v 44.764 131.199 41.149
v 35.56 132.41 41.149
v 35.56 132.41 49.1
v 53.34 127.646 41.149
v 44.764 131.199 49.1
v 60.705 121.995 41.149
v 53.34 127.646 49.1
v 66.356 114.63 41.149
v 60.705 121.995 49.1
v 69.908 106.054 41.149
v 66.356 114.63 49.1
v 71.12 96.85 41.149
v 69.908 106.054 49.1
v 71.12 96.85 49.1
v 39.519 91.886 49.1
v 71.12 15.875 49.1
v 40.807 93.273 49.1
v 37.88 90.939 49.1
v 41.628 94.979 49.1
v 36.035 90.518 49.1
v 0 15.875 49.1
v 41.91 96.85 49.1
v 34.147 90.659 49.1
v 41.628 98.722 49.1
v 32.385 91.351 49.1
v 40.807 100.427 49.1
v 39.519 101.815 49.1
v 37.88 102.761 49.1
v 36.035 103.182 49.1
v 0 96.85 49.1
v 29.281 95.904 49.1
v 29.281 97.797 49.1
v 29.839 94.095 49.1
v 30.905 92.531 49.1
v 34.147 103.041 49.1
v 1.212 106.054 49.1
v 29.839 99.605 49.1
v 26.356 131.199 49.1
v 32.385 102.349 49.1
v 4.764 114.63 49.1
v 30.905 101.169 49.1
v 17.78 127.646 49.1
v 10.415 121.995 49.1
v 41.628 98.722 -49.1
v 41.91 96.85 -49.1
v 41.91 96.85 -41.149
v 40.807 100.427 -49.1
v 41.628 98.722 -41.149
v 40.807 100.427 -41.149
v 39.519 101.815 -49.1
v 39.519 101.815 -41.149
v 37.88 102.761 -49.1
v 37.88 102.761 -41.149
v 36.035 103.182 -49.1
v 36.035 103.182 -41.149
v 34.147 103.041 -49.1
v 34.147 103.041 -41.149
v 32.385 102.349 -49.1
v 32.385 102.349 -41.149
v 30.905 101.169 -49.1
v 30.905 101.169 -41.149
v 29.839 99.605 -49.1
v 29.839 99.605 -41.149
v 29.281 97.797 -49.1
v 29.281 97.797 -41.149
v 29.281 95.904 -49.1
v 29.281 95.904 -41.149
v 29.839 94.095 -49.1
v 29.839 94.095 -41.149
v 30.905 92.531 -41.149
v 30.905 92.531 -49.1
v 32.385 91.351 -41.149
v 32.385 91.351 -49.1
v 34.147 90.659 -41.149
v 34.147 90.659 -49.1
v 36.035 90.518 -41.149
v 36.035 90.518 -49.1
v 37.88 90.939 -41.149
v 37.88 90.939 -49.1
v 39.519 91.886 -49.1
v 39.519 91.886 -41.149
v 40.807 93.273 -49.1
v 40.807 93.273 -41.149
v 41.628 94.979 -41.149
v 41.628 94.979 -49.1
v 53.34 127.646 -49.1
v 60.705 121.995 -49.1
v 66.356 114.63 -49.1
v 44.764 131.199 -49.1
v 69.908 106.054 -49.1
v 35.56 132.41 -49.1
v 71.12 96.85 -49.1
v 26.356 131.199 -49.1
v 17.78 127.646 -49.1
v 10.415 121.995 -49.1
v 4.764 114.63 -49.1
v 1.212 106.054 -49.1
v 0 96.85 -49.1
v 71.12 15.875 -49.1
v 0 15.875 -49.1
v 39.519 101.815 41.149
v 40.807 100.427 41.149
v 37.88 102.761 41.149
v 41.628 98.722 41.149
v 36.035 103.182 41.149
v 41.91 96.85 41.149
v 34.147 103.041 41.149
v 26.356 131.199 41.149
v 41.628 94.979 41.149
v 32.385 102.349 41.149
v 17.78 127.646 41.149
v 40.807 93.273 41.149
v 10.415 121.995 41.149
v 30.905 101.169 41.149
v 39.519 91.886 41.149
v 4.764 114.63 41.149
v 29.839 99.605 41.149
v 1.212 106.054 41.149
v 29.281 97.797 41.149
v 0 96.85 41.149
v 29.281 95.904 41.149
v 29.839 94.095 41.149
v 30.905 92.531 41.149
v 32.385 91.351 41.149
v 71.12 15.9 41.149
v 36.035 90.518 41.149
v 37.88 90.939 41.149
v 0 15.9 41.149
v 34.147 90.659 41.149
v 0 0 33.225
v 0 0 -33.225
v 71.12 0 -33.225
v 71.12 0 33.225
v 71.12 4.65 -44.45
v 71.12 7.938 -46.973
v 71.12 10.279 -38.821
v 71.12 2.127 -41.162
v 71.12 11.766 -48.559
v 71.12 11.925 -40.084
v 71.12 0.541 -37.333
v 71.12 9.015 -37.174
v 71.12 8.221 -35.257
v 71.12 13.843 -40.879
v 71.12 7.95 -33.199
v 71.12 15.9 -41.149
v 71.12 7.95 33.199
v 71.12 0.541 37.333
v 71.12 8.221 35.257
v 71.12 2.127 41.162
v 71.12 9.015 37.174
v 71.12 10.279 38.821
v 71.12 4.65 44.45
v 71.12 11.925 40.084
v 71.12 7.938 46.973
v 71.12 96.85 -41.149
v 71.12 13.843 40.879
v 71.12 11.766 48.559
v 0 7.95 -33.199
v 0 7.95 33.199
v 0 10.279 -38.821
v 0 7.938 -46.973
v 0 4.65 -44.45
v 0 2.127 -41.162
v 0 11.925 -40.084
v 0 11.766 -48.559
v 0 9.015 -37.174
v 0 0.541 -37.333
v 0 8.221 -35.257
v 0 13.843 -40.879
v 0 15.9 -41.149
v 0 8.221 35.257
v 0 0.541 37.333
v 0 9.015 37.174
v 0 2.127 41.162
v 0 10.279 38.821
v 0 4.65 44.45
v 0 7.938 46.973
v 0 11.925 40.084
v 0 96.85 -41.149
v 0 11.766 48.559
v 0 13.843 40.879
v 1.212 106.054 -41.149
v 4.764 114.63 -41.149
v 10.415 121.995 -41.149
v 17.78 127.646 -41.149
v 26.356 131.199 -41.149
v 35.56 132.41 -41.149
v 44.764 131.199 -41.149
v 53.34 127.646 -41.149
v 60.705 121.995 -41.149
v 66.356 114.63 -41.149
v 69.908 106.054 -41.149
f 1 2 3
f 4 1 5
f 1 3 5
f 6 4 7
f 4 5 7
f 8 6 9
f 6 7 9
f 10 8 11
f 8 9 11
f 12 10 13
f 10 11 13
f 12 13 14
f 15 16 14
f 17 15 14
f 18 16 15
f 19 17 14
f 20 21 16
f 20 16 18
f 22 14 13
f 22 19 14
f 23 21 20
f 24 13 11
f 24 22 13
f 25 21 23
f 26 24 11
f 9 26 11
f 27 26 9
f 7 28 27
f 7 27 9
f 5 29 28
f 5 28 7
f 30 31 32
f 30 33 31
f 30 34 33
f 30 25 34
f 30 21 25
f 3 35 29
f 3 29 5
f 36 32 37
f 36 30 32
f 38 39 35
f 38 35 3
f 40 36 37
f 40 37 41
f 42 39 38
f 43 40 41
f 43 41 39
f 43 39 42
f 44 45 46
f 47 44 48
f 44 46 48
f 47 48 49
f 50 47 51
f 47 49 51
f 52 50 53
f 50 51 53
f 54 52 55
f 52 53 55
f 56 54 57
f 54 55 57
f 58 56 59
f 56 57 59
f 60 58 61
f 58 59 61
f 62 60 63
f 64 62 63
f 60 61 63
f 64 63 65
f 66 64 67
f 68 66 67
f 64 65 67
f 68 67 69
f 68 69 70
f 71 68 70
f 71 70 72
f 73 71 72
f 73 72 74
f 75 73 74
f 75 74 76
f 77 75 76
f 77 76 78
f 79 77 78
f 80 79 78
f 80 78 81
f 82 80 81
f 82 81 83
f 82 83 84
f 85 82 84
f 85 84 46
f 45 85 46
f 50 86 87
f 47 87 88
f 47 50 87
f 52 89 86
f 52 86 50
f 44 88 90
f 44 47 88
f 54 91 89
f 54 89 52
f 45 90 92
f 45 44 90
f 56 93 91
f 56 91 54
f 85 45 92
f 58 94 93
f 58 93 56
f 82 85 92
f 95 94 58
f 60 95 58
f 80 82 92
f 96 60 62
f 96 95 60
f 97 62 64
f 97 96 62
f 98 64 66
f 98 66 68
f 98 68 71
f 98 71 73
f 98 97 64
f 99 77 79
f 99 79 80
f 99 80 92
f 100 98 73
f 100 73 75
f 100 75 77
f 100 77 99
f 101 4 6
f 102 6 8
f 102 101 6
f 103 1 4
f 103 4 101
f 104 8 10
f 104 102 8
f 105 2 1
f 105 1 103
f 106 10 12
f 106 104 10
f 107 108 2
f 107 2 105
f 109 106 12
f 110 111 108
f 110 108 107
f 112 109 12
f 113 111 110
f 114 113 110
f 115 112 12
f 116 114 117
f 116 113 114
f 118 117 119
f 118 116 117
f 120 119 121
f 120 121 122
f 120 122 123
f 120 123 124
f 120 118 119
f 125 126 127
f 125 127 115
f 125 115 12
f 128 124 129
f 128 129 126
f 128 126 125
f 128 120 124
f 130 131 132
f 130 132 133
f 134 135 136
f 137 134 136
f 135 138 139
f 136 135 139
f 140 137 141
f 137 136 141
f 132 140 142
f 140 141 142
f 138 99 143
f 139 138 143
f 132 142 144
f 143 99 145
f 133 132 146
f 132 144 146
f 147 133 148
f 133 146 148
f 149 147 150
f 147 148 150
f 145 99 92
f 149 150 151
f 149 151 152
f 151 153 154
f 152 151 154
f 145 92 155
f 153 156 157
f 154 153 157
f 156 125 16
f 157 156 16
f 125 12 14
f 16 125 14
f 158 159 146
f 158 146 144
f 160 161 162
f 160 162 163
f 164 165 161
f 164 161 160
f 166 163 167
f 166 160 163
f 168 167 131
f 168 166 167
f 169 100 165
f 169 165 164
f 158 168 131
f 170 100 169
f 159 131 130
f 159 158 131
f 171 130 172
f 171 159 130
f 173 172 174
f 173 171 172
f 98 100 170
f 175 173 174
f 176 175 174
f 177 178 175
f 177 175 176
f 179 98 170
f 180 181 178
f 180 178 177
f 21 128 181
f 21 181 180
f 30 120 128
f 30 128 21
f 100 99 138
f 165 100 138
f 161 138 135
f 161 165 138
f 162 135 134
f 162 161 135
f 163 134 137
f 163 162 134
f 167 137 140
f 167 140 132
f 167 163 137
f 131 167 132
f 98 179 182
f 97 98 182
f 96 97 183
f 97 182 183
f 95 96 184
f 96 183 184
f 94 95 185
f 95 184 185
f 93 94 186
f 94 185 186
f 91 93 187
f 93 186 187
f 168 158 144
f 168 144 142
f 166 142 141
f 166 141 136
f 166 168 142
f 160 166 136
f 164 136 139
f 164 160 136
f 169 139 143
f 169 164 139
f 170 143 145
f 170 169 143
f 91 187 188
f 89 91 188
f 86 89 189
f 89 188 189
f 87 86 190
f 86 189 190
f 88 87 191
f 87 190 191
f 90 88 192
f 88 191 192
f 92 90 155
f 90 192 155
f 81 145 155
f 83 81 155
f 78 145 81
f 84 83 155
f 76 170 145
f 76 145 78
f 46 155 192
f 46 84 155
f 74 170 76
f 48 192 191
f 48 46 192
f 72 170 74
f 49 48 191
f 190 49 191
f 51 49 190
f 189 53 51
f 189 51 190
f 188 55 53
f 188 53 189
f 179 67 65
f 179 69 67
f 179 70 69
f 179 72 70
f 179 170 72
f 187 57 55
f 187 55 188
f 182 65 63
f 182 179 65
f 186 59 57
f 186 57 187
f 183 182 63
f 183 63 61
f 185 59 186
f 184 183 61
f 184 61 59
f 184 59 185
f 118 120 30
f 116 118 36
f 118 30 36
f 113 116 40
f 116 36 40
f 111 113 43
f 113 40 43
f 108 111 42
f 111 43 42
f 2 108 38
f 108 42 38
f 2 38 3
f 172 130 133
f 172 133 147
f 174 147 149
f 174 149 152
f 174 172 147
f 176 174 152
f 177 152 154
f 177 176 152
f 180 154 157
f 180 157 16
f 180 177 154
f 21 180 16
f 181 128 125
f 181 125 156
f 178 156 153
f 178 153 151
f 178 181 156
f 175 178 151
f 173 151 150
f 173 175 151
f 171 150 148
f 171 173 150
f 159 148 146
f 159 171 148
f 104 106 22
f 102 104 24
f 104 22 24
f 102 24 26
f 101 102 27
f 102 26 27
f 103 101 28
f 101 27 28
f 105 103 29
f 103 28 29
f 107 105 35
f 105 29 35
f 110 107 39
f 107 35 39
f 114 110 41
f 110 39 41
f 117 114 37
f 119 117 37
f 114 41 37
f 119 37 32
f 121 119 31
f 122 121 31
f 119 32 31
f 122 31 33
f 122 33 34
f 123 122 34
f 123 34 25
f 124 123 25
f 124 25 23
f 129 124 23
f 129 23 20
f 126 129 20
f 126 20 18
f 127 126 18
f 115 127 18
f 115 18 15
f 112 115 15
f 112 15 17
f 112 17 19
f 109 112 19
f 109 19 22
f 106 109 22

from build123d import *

# Parameters (mm, degrees)
BOSS_EXTRUDE2_DEPTH = 71.12
CUT_EXTRUDE1_DEPTH  = 180.537265516
SKETCH6_3_R         = 6.35
CUT_EXTRUDE2_DEPTH  = 180.537265516


with BuildPart() as part:
    # Sketch1 → Boss-Extrude2 (new body)
    with BuildSketch(Plane(origin=(0, 0, 0), x_dir=(0, 0, -1), z_dir=(1, 0, 0))):
        with BuildLine():
            Line((33.224679849, 0), (-33.224679849, 0))
            ThreePointArc((-33.224679849, 0), (-44.45, 4.649679849), (-49.099679849, 15.875))
            Line((-49.099679849, 15.875), (-49.099679849, 132.4102))
            Line((-49.099679849, 132.4102), (-41.149479849, 132.4102))
            Line((-41.149479849, 132.4102), (-41.149479849, 15.9004))
            ThreePointArc((-41.149479849, 15.9004), (-38.82092018, 10.278759668), (-33.199279849, 7.9502))
            Line((-33.199279849, 7.9502), (33.199279849, 7.9502))
            ThreePointArc((33.199279849, 7.9502), (38.82092018, 10.278759668), (41.149479849, 15.9004))
            Line((41.149479849, 15.9004), (41.149479849, 132.4102))
            Line((41.149479849, 132.4102), (49.099679849, 132.4102))
            Line((49.099679849, 132.4102), (49.099679849, 15.875))
            ThreePointArc((49.099679849, 15.875), (44.45, 4.649679849), (33.224679849, 0))
        make_face()
    extrude(amount=BOSS_EXTRUDE2_DEPTH)

    # Sketch6 → Cut-Extrude1 (cut, through all)
    with BuildSketch(Plane.XY.offset(49.099679849)):
        with BuildLine():
            Line((71.12, 132.4102), (35.56, 132.4102))
            ThreePointArc((35.56, 132.4102), (60.704717139, 121.994917139), (71.12, 96.8502))
            Line((71.12, 96.8502), (71.12, 132.4102))
        make_face()
        with BuildLine():
            Line((0, 132.4102), (0, 96.8502))
            ThreePointArc((0, 96.8502), (10.415282861, 121.994917139), (35.56, 132.4102))
            Line((35.56, 132.4102), (0, 132.4102))
        make_face()
    extrude(amount=-CUT_EXTRUDE1_DEPTH, mode=Mode.SUBTRACT)

    # Sketch6_3 → Cut-Extrude2 (cut, through all)
    with BuildSketch(Plane.XY.offset(49.099679849)):
        with Locations((35.56, 96.8502)):
            Circle(SKETCH6_3_R)
    extrude(amount=-CUT_EXTRUDE2_DEPTH, mode=Mode.SUBTRACT)


solid = part.part
